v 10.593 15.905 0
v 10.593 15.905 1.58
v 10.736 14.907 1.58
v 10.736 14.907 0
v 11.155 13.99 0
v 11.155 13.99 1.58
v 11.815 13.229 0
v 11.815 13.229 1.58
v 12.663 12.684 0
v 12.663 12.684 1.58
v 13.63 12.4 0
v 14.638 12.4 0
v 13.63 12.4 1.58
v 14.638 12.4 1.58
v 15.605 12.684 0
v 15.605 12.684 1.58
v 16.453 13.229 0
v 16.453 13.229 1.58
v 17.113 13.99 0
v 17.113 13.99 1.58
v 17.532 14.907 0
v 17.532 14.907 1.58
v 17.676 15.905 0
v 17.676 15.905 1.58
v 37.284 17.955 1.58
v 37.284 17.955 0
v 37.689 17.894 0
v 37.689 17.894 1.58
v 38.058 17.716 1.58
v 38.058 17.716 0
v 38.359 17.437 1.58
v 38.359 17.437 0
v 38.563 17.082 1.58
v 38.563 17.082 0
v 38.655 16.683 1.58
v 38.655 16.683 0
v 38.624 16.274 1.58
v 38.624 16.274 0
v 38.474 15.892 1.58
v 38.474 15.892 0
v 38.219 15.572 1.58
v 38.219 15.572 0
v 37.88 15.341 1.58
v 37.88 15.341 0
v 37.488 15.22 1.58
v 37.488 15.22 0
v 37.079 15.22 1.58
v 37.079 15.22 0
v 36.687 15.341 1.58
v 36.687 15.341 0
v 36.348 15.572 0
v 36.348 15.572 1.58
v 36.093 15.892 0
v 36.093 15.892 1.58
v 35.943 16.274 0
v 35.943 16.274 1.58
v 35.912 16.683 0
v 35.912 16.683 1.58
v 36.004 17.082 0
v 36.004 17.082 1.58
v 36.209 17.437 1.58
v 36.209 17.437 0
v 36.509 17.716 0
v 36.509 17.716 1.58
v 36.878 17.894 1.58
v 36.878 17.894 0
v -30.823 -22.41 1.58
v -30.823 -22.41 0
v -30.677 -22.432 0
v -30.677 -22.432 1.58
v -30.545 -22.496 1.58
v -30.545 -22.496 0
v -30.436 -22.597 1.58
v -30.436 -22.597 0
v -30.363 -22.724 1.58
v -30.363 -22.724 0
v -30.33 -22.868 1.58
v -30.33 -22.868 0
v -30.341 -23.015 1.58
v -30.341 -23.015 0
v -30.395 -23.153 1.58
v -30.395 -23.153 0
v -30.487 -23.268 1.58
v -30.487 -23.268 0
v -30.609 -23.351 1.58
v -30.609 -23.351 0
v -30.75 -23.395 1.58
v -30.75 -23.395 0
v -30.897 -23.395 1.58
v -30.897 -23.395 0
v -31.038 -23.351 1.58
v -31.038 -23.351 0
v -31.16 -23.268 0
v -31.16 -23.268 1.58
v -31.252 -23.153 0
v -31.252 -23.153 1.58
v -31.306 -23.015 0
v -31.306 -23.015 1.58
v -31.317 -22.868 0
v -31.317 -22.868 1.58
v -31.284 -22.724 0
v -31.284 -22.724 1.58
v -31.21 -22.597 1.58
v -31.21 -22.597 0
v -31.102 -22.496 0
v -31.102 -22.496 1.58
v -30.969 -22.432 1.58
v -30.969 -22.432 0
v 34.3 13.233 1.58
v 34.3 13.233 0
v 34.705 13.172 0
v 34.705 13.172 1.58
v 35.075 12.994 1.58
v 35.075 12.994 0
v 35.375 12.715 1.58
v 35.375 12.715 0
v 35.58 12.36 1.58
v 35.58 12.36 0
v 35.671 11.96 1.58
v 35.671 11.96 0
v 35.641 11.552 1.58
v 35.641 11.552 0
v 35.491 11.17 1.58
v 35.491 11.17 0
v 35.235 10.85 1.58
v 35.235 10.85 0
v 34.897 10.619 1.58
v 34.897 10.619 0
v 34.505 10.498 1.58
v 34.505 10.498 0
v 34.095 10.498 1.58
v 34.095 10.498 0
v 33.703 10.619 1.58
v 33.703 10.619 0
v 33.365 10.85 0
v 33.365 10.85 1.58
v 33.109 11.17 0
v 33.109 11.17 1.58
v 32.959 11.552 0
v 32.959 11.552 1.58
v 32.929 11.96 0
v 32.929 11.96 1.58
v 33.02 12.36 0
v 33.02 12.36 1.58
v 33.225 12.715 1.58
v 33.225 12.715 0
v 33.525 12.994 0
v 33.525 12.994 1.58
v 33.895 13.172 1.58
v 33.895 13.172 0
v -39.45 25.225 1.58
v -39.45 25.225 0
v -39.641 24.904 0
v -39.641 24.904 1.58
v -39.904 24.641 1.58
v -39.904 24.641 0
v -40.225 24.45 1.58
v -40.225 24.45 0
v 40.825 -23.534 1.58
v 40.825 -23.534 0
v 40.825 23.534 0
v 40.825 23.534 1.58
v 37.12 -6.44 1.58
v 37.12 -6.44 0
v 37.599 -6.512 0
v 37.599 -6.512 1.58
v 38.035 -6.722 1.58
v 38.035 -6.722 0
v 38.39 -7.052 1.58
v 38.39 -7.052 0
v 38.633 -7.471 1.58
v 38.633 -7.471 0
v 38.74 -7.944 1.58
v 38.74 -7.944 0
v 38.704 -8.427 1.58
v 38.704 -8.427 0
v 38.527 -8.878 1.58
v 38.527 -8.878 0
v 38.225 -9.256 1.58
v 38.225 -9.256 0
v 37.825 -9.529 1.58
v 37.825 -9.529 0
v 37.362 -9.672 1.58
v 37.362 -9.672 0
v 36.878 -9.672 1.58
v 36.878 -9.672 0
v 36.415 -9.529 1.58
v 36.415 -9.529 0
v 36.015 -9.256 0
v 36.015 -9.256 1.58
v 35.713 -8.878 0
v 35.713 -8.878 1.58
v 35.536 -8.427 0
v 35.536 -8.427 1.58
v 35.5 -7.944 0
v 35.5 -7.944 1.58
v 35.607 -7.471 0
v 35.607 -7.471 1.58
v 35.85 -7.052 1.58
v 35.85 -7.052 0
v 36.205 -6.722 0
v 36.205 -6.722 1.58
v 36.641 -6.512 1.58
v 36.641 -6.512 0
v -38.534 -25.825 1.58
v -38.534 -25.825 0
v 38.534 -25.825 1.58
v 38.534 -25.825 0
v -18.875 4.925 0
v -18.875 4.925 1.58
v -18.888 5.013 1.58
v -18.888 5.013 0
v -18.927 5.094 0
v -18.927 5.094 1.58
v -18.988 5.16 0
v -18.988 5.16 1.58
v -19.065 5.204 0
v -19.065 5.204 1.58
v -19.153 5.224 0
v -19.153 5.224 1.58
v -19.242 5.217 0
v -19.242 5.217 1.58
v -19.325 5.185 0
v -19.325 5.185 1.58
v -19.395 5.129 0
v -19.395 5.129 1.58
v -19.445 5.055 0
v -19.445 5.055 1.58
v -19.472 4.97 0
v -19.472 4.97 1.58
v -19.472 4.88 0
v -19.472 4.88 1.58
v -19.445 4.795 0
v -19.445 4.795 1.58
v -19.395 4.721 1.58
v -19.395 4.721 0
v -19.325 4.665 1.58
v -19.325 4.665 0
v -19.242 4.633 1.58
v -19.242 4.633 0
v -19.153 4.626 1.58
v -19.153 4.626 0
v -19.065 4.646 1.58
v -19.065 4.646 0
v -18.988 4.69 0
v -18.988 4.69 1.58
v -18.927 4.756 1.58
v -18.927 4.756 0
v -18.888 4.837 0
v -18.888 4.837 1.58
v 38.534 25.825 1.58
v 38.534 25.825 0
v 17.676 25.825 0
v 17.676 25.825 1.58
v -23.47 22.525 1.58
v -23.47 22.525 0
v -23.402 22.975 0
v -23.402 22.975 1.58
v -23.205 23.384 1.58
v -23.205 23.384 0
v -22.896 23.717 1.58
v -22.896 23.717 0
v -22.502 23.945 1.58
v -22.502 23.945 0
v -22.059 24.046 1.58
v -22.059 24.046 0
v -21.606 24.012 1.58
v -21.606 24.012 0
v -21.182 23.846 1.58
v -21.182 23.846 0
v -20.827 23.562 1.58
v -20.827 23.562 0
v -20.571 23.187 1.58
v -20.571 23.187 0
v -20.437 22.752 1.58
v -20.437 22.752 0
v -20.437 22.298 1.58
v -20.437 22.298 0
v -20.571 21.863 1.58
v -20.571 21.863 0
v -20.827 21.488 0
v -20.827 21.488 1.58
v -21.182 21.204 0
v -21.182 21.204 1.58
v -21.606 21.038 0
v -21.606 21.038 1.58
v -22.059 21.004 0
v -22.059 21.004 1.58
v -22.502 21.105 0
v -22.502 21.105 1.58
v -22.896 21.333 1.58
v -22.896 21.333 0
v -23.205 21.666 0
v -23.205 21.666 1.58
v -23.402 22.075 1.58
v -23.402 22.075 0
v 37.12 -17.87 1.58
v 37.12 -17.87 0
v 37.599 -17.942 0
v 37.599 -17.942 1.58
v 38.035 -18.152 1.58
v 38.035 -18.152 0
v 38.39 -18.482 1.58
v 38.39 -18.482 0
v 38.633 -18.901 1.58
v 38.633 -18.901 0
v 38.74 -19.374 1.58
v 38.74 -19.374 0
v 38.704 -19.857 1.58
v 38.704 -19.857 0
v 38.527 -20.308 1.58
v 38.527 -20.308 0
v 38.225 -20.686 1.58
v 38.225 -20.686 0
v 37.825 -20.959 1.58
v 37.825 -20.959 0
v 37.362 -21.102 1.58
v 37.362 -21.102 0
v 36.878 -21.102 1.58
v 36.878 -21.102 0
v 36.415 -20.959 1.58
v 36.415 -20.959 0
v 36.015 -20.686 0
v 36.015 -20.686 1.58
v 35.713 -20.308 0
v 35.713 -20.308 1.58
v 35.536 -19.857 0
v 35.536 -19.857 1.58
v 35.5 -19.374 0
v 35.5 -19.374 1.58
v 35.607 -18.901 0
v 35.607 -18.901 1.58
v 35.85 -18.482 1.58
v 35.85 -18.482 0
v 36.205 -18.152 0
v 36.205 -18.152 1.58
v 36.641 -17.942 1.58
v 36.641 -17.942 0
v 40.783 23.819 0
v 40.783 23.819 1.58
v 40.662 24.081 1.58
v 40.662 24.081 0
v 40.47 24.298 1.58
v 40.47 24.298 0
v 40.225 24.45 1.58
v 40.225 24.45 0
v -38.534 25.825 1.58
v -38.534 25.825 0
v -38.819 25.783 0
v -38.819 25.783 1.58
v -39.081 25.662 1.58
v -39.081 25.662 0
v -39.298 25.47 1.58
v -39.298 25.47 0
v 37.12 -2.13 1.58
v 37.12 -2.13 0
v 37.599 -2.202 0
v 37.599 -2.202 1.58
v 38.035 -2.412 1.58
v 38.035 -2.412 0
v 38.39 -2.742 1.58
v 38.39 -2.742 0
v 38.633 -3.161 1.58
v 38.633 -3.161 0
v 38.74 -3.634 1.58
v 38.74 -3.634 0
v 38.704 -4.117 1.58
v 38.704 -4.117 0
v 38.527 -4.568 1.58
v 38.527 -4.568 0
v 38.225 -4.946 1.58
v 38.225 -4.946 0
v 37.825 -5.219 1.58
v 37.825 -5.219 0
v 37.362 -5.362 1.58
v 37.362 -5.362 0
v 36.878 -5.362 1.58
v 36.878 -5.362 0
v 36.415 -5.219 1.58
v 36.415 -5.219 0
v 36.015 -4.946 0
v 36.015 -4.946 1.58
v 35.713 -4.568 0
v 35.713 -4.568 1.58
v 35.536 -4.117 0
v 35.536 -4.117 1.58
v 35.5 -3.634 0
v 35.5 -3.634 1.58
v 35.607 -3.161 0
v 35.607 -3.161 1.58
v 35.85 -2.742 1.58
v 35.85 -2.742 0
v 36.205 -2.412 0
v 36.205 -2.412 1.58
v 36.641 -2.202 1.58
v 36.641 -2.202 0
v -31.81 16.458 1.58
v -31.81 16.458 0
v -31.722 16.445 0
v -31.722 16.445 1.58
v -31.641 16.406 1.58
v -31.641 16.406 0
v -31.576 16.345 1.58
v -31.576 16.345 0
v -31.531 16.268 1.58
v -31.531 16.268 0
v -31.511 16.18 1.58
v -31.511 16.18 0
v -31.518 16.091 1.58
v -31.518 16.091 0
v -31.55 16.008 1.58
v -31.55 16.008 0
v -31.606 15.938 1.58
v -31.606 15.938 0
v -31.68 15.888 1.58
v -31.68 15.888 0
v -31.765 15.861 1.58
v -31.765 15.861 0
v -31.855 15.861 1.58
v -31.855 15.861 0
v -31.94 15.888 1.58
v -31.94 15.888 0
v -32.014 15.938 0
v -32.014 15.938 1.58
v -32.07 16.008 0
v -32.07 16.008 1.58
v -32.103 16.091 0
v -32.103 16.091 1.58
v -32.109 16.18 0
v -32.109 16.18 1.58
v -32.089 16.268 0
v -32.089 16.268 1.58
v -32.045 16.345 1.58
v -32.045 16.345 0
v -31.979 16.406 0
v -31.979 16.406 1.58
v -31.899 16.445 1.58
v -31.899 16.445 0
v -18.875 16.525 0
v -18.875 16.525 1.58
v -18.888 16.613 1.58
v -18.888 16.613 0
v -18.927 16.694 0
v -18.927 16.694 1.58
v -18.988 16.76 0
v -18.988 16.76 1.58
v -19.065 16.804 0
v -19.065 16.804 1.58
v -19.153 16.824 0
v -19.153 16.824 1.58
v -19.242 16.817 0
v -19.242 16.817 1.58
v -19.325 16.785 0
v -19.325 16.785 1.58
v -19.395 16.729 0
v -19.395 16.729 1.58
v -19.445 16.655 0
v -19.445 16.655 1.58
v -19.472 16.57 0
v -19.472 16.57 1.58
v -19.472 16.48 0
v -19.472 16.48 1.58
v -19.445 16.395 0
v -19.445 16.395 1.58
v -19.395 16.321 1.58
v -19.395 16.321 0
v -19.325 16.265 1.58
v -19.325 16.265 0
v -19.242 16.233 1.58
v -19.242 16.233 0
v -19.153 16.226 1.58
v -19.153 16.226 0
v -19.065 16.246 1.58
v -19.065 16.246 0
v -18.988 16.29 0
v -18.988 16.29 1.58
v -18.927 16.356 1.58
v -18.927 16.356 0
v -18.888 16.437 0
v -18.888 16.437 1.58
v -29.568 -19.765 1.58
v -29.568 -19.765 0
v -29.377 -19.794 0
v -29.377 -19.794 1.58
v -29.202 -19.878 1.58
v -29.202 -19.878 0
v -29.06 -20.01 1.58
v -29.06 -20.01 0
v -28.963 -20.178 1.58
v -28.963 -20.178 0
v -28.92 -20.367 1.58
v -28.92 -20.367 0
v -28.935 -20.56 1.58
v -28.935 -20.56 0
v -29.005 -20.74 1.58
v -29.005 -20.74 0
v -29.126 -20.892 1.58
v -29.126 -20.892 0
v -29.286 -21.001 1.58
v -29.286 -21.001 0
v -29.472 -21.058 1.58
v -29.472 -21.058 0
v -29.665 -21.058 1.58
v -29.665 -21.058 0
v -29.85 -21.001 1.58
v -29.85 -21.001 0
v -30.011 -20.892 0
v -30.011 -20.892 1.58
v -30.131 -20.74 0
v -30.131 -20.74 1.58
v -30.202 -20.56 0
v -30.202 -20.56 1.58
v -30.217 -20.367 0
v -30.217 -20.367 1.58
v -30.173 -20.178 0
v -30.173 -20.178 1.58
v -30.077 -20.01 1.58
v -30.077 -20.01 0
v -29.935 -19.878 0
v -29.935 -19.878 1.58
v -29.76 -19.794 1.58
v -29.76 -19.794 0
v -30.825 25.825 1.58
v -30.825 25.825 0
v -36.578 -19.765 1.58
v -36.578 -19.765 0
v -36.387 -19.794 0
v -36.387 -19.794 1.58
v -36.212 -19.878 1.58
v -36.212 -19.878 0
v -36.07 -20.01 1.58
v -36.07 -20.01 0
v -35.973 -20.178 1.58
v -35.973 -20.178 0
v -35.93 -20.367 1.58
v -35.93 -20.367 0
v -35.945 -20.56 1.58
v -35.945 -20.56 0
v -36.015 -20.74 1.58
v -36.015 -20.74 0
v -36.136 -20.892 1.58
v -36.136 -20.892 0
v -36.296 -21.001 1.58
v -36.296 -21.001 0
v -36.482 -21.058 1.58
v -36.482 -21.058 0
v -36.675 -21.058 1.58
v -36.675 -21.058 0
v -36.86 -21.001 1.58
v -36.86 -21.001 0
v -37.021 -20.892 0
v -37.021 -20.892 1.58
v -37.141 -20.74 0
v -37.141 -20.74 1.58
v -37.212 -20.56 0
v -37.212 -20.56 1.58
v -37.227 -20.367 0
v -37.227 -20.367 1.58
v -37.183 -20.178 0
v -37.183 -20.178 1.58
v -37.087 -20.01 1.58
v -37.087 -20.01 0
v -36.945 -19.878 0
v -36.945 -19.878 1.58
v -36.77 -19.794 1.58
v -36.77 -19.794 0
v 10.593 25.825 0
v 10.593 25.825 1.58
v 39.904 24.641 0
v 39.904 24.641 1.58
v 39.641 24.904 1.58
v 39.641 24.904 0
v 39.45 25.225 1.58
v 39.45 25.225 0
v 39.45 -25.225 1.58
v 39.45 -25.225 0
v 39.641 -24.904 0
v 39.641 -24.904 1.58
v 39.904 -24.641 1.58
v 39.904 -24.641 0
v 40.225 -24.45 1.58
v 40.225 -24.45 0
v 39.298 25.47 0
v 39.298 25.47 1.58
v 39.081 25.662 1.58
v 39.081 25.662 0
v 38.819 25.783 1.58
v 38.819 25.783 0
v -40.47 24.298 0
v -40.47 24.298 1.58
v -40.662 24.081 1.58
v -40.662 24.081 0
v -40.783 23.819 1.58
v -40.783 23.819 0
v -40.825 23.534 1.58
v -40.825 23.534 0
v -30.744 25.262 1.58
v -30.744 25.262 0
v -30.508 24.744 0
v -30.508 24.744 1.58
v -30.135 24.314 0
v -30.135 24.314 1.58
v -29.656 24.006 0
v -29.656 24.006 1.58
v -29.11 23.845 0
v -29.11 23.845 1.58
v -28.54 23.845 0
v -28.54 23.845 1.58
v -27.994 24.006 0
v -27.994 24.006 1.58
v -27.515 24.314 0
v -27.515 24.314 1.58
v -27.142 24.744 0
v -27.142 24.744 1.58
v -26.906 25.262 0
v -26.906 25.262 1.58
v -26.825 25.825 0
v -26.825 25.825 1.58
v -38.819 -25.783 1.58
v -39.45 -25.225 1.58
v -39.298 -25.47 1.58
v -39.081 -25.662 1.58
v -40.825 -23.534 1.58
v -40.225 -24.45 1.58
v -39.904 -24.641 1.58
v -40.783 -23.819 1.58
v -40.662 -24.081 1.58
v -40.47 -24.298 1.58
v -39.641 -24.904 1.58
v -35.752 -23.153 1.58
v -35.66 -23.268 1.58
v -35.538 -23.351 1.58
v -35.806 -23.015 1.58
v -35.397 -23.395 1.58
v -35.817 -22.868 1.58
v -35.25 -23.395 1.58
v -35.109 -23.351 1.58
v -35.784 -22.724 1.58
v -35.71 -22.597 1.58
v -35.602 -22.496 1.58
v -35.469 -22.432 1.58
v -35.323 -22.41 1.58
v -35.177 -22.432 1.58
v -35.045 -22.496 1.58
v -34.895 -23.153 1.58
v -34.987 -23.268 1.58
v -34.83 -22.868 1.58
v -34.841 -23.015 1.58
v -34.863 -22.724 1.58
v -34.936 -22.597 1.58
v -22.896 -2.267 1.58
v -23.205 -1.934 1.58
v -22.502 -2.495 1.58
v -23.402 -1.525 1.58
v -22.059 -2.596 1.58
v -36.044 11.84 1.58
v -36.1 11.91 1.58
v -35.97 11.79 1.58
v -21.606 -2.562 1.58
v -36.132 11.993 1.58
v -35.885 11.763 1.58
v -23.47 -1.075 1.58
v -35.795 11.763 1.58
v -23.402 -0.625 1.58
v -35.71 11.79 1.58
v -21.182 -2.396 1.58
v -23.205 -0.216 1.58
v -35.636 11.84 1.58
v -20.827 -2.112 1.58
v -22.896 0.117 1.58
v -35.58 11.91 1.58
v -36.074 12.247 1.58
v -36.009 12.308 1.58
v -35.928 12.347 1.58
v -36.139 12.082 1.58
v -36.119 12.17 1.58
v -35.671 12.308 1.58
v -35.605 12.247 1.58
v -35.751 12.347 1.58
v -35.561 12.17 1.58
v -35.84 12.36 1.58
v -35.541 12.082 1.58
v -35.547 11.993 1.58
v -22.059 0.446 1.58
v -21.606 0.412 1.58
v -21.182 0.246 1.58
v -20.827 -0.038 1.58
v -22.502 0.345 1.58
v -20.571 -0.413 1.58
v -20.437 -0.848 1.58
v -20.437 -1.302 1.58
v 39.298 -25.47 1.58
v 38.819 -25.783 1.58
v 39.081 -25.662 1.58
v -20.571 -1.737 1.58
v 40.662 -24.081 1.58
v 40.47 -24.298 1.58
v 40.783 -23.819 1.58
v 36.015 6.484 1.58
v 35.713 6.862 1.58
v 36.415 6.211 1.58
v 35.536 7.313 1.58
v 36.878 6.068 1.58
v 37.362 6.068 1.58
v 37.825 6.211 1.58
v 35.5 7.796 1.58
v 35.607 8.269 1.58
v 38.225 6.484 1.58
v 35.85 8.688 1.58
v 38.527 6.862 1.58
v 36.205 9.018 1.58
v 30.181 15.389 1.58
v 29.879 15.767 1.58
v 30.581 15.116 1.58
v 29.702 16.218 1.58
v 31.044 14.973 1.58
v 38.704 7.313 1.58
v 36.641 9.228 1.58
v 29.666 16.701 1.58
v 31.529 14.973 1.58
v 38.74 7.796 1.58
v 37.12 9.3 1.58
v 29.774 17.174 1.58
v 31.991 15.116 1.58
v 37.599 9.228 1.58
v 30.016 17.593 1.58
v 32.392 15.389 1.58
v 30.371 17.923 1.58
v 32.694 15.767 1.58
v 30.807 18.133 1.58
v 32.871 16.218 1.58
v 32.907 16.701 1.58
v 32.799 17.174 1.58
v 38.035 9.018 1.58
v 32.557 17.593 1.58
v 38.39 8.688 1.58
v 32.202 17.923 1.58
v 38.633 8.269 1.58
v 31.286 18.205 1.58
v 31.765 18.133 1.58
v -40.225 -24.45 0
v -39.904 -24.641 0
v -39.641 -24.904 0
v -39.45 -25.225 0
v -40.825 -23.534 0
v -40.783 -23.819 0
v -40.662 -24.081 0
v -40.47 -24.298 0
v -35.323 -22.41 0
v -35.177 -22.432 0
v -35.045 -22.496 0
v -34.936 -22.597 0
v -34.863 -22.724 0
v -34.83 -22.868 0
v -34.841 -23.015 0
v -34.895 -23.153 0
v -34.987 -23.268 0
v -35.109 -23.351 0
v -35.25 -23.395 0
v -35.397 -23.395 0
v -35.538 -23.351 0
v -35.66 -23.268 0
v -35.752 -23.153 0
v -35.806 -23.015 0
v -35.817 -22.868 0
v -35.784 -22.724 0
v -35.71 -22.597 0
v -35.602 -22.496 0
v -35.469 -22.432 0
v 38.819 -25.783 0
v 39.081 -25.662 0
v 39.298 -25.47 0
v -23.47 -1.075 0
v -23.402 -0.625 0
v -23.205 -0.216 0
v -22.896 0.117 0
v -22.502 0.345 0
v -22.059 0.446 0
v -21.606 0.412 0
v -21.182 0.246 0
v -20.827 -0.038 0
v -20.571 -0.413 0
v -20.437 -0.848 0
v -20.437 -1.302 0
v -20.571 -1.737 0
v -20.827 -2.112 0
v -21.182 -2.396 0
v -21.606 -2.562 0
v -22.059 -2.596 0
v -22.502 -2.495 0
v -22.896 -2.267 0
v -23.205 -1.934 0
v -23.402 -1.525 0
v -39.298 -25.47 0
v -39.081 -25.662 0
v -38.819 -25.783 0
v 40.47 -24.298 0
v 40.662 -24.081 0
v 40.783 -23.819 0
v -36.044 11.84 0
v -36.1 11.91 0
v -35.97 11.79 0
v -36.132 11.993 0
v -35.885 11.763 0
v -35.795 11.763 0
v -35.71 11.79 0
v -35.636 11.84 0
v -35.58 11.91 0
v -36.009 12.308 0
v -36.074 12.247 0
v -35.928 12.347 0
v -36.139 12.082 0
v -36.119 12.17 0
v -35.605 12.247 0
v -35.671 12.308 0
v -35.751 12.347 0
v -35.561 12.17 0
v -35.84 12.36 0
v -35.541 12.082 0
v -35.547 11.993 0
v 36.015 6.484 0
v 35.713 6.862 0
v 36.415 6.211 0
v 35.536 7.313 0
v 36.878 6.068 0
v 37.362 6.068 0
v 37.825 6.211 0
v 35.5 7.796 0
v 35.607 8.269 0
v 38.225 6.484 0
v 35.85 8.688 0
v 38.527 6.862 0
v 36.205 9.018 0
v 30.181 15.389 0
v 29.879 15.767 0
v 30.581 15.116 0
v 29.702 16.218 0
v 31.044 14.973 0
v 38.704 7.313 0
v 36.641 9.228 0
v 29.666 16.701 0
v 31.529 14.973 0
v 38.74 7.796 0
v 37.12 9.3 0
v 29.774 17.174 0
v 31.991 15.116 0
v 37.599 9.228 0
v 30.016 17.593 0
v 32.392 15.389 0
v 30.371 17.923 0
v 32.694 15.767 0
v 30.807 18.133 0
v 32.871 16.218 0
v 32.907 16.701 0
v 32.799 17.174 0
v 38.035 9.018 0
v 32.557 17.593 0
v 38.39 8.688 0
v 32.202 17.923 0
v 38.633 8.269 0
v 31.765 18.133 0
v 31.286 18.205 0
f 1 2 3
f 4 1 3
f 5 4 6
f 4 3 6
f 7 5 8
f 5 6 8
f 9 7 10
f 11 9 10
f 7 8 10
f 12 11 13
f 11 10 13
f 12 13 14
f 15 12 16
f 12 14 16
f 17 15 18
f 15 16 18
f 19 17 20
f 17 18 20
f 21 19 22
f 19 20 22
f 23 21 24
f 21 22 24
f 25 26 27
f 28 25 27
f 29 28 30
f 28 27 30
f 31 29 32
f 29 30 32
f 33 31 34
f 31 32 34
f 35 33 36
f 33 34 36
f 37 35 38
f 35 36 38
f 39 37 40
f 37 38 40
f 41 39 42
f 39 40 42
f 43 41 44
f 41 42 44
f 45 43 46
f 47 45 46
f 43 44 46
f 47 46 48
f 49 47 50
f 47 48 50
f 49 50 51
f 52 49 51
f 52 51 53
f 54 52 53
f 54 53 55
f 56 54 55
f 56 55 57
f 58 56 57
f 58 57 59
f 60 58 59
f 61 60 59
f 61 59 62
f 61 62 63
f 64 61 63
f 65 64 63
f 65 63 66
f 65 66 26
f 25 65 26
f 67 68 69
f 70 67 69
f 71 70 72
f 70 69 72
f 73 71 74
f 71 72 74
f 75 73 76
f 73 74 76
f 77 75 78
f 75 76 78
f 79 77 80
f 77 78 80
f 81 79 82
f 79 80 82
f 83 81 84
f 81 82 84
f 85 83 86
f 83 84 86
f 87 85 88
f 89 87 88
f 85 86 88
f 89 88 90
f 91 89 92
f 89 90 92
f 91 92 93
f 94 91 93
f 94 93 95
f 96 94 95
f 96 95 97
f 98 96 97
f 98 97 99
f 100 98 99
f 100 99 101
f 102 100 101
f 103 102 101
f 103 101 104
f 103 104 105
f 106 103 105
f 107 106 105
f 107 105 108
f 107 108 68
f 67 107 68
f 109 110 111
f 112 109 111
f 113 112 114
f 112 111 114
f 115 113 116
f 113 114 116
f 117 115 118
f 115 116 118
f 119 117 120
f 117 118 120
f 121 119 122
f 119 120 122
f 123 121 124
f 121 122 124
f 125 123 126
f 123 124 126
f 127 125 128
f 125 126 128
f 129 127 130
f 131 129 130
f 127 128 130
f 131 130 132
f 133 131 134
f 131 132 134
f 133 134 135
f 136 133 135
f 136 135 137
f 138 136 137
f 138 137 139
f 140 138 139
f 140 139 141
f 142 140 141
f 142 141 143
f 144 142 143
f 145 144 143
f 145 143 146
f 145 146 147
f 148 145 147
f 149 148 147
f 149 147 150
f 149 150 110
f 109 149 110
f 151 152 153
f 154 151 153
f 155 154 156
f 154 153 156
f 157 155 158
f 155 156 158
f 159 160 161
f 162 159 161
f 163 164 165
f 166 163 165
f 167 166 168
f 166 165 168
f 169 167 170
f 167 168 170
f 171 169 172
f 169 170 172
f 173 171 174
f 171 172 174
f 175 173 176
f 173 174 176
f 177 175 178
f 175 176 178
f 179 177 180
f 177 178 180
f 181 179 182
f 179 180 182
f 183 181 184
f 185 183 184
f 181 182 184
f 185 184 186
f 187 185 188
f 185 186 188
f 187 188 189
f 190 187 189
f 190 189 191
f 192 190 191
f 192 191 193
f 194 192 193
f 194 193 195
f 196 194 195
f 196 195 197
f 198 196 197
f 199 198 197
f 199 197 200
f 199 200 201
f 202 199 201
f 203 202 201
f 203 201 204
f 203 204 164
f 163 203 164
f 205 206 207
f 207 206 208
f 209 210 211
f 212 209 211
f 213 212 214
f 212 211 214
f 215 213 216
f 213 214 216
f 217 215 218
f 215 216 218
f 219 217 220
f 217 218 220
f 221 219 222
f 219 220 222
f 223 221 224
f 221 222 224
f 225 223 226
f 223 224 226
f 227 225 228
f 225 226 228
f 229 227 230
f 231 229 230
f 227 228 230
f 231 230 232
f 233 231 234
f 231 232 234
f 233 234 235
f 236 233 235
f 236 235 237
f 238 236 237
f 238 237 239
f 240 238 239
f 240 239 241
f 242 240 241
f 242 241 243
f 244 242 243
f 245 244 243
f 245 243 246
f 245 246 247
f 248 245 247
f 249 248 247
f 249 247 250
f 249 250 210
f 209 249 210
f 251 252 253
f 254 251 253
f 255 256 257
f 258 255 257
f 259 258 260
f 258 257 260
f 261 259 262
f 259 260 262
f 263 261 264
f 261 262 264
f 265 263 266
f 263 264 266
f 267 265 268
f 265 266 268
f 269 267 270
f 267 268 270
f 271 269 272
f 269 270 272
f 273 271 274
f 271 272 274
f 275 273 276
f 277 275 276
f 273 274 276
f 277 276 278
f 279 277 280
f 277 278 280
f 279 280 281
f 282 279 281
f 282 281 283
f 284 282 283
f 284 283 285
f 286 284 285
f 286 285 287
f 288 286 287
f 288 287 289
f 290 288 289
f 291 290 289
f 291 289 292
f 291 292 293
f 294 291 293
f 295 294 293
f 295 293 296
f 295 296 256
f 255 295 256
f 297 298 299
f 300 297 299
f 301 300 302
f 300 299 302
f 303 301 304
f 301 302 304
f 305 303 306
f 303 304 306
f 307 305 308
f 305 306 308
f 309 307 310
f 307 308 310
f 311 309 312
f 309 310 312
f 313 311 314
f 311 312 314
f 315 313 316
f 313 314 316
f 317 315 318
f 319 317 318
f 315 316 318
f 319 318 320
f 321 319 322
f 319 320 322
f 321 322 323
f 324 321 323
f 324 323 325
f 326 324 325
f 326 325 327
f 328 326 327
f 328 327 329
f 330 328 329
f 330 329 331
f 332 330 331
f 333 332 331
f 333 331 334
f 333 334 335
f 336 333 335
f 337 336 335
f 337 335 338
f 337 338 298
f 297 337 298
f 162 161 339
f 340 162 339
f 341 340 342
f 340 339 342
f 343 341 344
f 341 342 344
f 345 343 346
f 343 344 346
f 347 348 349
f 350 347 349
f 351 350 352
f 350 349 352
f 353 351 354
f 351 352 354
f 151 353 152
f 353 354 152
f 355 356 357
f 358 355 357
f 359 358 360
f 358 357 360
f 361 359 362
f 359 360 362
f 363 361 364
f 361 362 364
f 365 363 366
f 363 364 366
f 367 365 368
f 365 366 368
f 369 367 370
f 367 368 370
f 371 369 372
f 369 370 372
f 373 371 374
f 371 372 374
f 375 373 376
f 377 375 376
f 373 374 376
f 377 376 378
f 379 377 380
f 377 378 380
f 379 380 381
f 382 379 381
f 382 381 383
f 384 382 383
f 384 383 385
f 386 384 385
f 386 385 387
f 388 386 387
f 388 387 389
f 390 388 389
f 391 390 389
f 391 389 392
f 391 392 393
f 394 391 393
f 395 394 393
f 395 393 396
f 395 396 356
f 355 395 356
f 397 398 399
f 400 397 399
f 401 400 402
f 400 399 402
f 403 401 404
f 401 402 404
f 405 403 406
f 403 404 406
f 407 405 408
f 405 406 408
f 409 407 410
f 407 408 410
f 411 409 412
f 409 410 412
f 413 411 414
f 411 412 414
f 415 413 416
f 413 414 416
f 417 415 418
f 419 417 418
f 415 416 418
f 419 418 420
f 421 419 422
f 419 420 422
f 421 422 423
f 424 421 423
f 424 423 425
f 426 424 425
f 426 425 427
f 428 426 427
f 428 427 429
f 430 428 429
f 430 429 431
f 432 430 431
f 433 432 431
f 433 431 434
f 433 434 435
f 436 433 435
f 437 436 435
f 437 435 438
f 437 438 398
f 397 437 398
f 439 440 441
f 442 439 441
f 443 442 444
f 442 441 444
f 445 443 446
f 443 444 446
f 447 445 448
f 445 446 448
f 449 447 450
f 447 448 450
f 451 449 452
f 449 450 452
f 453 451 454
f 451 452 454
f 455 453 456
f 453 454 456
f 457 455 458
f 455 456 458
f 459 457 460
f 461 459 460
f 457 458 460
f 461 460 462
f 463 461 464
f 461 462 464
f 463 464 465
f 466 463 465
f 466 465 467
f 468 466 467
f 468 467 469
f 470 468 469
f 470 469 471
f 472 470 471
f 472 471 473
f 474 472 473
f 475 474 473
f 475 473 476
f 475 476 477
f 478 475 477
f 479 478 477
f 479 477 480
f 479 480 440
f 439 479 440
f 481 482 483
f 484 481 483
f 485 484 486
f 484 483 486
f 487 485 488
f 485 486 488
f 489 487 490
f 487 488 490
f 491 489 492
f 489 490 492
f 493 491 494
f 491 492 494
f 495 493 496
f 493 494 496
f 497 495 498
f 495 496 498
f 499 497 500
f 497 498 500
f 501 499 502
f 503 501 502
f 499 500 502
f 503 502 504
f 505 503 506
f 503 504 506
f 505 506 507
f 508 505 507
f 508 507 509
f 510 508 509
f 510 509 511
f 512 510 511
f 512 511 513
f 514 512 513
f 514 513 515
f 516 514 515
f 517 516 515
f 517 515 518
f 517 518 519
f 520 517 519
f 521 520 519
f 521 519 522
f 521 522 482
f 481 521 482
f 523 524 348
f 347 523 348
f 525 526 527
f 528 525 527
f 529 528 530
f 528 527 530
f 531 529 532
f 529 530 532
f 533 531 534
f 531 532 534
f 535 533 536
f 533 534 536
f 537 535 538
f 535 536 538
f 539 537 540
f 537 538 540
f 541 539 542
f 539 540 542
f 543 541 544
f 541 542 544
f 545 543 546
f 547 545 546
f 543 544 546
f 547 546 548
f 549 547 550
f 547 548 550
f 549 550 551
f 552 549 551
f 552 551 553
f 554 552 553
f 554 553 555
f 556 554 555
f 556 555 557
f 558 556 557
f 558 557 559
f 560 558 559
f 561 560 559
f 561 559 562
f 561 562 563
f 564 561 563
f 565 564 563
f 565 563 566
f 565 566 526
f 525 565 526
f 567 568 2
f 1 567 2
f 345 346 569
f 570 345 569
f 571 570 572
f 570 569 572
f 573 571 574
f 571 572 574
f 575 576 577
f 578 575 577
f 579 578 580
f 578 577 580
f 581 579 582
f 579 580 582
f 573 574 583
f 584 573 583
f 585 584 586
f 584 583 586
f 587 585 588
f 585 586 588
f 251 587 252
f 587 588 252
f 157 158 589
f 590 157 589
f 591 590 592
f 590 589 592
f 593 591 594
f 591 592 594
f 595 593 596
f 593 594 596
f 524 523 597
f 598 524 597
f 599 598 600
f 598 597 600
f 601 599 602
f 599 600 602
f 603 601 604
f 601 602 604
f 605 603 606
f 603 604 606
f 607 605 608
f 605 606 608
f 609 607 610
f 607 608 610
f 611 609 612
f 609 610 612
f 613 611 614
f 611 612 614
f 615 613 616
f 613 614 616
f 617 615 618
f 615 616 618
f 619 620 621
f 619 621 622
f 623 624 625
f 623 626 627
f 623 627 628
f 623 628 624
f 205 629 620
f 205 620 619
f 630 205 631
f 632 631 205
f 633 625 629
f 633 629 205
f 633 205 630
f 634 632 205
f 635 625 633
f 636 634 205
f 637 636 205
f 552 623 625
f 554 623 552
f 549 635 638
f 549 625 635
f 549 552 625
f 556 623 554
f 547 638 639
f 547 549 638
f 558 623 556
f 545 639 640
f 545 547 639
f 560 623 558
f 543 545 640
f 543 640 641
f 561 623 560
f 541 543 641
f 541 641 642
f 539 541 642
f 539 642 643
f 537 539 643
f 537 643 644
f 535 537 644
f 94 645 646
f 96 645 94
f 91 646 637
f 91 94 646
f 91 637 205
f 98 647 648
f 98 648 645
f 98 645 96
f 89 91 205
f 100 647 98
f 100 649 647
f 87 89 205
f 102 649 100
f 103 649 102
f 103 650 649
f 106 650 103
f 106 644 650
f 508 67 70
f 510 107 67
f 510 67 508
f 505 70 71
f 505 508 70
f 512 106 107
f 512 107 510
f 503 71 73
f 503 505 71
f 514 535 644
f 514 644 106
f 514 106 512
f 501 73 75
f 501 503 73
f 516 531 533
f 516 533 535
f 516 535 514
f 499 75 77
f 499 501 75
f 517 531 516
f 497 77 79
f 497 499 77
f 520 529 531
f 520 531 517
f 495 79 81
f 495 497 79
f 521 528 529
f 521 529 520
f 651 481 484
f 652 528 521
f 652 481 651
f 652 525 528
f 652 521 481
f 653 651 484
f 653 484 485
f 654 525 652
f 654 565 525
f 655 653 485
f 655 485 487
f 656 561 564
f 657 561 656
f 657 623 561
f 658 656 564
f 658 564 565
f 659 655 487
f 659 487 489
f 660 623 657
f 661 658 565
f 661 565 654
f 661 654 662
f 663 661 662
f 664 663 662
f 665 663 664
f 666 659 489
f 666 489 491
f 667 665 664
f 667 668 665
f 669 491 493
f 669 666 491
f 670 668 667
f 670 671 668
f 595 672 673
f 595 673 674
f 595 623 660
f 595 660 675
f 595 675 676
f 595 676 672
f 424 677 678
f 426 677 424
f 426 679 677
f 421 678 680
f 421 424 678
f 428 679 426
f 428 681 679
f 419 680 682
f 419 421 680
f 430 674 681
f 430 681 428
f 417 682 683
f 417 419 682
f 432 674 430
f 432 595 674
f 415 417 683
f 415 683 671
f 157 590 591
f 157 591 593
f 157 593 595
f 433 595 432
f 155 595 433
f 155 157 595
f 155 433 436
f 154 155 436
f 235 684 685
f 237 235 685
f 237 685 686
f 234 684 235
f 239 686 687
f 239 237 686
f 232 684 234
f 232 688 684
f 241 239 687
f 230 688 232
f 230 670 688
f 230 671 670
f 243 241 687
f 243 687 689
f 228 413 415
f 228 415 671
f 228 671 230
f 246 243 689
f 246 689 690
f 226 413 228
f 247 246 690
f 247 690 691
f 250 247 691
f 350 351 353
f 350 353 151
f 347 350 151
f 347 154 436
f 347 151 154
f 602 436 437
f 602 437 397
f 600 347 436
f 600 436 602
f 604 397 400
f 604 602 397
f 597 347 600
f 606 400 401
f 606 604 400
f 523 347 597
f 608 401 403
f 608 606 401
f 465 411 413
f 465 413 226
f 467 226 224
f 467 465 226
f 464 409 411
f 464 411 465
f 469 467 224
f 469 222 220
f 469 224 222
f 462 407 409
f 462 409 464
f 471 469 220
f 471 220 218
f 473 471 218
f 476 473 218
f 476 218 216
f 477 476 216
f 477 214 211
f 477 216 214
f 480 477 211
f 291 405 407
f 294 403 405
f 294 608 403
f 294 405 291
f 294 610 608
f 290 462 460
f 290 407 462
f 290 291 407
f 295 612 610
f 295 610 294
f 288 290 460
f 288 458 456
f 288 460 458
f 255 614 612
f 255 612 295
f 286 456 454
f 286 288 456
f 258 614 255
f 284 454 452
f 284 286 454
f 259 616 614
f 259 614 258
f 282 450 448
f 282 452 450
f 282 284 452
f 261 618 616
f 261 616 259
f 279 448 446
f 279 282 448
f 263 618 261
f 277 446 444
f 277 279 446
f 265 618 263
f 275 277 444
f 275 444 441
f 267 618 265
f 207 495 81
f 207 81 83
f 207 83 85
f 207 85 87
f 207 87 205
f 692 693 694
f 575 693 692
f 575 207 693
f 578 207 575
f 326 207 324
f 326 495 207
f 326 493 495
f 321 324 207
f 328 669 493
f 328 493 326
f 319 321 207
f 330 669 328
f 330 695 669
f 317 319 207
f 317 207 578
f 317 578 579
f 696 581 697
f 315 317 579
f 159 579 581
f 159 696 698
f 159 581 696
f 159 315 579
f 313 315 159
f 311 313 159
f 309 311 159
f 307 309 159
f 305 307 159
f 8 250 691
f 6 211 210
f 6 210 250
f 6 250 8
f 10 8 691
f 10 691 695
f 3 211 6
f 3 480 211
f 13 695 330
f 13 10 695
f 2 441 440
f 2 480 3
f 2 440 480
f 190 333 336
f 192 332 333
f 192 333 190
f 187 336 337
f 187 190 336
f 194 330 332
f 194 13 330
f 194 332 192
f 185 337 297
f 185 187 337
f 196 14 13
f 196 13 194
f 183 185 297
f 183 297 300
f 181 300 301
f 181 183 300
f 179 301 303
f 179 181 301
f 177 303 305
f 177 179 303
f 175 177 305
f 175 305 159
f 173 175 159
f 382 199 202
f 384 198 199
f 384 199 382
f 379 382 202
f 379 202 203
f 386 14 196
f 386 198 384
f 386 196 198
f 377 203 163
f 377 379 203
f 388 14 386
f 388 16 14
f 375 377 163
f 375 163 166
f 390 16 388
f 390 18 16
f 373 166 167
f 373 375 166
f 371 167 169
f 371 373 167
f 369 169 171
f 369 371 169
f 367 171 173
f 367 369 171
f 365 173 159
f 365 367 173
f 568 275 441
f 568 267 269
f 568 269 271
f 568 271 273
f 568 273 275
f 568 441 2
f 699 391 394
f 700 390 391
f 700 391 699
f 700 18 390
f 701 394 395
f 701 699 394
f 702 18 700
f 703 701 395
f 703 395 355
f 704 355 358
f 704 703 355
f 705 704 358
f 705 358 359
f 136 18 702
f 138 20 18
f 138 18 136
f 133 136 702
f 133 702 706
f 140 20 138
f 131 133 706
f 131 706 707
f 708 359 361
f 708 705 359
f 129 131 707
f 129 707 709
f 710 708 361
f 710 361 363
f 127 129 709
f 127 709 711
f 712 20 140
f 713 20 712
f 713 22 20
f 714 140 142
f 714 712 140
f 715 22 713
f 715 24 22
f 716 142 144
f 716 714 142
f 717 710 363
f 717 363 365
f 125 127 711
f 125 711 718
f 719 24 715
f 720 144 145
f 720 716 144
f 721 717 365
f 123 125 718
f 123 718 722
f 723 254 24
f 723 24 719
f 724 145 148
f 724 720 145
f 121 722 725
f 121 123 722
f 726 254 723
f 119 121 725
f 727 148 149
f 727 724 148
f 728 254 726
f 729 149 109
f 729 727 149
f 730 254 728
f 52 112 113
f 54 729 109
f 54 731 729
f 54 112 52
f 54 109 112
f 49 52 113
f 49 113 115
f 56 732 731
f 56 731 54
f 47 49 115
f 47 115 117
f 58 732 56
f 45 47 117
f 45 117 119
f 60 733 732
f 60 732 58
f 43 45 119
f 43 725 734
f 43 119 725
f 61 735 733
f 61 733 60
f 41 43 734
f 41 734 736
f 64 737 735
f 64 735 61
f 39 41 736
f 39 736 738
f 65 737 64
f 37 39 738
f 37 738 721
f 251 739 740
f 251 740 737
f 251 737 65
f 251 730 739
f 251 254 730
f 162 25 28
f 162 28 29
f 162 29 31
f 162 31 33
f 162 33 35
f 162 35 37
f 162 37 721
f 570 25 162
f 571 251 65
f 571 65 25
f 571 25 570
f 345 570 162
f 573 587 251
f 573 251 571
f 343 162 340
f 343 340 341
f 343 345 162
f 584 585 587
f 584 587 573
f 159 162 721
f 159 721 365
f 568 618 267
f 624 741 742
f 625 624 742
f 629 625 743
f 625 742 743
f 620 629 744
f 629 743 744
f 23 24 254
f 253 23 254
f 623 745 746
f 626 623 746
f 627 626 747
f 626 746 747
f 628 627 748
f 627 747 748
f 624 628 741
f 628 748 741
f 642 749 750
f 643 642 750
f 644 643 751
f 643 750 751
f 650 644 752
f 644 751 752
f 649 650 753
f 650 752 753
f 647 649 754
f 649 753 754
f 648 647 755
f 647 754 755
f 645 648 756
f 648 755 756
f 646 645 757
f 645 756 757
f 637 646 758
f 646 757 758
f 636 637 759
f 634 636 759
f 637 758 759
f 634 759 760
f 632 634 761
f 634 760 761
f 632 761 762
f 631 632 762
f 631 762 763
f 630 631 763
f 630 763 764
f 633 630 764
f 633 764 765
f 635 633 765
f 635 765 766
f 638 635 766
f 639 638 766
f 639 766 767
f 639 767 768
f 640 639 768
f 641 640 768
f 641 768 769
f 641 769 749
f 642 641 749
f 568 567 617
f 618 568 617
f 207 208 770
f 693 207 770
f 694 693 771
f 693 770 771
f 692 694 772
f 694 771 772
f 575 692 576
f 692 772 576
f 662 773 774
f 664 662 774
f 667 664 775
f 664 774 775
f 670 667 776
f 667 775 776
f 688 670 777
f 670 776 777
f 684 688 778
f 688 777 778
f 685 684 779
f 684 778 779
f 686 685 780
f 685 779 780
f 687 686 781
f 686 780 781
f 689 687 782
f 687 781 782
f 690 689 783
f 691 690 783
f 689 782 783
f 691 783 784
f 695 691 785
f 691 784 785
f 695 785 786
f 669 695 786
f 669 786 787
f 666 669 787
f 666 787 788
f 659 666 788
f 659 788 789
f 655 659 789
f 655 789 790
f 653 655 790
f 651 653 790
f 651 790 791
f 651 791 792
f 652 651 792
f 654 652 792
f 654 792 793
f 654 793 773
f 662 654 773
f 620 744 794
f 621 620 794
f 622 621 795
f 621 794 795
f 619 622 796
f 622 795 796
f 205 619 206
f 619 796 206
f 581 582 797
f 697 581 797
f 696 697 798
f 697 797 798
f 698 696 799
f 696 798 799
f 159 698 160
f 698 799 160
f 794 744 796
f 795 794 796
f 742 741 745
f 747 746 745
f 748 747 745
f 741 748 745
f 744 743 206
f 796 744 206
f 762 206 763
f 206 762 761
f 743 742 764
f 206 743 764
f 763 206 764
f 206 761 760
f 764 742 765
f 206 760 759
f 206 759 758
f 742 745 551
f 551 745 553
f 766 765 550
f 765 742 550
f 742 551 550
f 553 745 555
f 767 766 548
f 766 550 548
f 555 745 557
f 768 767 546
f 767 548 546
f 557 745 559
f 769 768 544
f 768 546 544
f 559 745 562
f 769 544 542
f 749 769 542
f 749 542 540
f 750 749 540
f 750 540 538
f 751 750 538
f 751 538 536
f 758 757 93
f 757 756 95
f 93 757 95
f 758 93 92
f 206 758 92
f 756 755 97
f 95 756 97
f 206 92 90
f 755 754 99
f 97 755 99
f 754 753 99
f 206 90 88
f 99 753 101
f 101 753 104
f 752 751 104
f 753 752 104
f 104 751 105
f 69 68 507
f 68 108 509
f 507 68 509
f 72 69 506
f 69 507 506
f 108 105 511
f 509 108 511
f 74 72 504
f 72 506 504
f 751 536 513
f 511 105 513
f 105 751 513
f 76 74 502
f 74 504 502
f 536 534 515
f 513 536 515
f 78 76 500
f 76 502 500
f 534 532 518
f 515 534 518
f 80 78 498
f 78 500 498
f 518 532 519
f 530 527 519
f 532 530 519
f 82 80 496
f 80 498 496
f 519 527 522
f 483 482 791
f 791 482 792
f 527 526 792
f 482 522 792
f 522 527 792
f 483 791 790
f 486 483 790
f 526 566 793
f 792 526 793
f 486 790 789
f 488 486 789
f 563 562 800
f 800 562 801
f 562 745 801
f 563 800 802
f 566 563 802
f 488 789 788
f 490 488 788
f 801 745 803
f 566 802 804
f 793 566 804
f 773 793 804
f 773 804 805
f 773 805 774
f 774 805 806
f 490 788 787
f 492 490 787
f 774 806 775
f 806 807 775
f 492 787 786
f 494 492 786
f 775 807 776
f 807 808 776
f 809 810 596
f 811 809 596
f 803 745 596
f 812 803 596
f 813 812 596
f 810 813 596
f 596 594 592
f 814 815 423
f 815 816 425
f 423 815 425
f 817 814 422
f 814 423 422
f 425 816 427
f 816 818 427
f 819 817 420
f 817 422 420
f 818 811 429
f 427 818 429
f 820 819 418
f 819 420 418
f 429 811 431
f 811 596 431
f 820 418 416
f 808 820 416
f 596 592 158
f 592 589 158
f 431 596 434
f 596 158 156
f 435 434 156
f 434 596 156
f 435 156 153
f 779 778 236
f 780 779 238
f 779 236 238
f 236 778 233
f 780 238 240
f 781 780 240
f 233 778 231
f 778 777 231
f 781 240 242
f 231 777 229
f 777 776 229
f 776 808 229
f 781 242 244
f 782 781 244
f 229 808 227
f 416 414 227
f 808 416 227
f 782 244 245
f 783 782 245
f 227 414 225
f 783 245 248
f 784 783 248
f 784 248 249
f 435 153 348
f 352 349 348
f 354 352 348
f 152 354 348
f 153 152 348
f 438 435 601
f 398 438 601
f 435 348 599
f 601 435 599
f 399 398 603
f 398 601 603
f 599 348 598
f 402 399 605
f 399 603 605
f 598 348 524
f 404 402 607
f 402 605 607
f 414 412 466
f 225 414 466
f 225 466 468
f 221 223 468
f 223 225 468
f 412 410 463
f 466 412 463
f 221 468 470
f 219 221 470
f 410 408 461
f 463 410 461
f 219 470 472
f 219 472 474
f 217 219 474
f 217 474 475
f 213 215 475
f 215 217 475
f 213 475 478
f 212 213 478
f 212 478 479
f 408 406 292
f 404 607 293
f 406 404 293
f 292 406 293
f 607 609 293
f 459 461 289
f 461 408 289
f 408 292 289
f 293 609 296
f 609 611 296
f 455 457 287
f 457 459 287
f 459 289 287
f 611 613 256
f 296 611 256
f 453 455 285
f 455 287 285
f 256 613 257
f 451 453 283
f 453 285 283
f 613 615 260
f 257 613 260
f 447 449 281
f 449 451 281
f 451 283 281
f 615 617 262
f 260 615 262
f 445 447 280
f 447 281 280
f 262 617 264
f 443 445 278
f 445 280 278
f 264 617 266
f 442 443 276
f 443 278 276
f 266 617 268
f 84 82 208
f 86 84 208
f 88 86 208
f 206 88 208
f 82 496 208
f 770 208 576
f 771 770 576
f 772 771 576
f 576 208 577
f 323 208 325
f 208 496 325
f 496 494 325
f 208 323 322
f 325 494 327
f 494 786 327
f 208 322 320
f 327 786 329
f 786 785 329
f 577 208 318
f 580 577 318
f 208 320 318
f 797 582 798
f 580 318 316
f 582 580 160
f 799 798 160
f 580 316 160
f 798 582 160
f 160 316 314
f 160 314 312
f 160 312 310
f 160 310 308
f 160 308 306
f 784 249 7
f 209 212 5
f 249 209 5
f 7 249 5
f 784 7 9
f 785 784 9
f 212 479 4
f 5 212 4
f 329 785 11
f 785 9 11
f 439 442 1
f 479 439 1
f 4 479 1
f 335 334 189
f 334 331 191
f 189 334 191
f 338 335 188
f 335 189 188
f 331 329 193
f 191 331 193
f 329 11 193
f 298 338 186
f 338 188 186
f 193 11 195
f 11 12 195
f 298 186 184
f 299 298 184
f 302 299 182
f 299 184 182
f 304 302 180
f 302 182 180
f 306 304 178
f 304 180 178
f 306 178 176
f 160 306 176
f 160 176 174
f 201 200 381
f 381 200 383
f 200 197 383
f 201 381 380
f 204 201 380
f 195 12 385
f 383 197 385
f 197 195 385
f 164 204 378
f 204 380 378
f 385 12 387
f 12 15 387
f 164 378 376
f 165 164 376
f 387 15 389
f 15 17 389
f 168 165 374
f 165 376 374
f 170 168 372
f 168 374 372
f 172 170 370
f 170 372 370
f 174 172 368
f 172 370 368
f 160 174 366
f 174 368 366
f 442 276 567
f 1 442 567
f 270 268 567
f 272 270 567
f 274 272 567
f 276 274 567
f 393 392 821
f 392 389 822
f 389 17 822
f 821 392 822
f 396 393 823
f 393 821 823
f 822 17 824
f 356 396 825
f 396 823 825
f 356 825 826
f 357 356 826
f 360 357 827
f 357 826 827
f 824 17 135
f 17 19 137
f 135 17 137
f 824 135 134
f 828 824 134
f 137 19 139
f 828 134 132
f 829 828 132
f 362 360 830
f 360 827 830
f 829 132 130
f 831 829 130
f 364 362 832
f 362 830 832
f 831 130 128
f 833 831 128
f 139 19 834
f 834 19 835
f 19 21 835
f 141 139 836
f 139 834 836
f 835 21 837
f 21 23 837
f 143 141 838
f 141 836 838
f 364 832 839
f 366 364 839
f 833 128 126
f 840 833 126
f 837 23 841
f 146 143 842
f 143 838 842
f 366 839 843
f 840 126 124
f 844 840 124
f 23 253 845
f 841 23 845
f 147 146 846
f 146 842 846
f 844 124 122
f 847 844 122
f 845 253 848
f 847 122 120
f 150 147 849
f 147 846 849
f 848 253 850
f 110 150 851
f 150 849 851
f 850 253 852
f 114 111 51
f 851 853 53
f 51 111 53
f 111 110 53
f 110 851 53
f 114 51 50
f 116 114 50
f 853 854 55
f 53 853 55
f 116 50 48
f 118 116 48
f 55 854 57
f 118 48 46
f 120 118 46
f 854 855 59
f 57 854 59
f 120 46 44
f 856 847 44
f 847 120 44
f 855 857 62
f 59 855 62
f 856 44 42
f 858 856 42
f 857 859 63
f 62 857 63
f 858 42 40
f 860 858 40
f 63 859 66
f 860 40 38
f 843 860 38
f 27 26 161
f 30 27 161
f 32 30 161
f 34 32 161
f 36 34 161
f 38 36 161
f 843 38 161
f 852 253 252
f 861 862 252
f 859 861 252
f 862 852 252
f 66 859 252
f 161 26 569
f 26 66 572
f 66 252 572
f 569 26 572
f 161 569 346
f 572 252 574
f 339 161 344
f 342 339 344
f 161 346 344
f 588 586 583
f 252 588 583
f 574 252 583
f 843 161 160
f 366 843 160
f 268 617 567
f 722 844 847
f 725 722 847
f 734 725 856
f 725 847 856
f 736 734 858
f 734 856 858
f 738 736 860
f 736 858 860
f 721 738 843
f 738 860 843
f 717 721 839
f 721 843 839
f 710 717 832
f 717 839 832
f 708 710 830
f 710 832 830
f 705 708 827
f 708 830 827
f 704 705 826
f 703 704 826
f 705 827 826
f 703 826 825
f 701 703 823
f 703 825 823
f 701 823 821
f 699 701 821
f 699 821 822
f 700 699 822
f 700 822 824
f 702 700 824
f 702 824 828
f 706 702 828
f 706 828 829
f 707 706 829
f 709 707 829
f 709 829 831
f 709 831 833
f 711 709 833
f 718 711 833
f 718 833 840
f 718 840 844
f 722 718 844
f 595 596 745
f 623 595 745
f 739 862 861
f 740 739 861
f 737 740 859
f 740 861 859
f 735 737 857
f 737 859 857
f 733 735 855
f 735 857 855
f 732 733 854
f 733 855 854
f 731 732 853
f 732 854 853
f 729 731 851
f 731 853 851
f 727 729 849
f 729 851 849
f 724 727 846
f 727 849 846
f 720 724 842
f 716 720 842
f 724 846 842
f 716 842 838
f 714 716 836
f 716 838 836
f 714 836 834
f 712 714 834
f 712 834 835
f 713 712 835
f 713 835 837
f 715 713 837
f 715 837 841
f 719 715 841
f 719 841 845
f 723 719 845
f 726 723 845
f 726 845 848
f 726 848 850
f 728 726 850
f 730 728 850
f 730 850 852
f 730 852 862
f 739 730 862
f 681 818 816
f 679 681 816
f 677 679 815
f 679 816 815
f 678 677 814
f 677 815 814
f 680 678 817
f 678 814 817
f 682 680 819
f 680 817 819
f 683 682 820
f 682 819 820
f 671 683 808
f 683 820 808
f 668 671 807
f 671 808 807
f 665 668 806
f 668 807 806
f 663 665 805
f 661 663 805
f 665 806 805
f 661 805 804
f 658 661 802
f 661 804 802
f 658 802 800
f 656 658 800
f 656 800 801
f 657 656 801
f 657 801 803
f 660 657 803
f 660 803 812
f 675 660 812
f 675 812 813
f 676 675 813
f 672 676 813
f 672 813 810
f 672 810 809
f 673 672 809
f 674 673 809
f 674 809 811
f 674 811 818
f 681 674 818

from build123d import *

# Parameters (mm, degrees)
BOSS_EXTRUDE2_DEPTH = 1.58
CUT_EXTRUDE4_DEPTH  = 49.333297529
SKETCH6_R           = 0.3
CUT_EXTRUDE9_DEPTH  = 49.333297529
SKETCH5_R           = 0.3
SKETCH5_R_2         = 1.525
CUT_EXTRUDE10_DEPTH = 49.333297529
SKETCH7_R           = 0.65
SKETCH7_R_2         = 0.495
SKETCH7_R_3         = 0.3
SKETCH7_R_4         = 1.625
SKETCH7_R_5         = 1.375
CUT_EXTRUDE11_DEPTH = 49.333297529
SKETCH13_R          = 2
CUT_EXTRUDE12_DEPTH = 49.333297529


with BuildPart() as part:
    # Sketch3 → Boss-Extrude2 (new body)
    with BuildSketch(Plane.XY):
        with BuildLine():
            Line((-38.533712153, -25.825), (38.533712153, -25.825))
            ThreePointArc((38.533712153, -25.825), (39.08143471, -25.661660027), (39.450227292, -25.225))
            ThreePointArc((39.450227292, -25.225), (39.764339828, -24.764339828), (40.225, -24.450227292))
            ThreePointArc((40.225, -24.450227292), (40.661660027, -24.08143471), (40.825, -23.533712153))
            Line((40.825, -23.533712153), (40.825, 23.533712153))
            ThreePointArc((40.825, 23.533712153), (40.661660027, 24.08143471), (40.225, 24.450227292))
            ThreePointArc((40.225, 24.450227292), (39.764339828, 24.764339828), (39.450227292, 25.225))
            ThreePointArc((39.450227292, 25.225), (39.08143471, 25.661660027), (38.533712153, 25.825))
            Line((38.533712153, 25.825), (-38.533712153, 25.825))
            ThreePointArc((-38.533712153, 25.825), (-39.08143471, 25.661660027), (-39.450227292, 25.225))
            ThreePointArc((-39.450227292, 25.225), (-39.764339828, 24.764339828), (-40.225, 24.450227292))
            ThreePointArc((-40.225, 24.450227292), (-40.661660027, 24.08143471), (-40.825, 23.533712153))
            Line((-40.825, 23.533712153), (-40.825, -23.533712153))
            ThreePointArc((-40.825, -23.533712153), (-40.661660027, -24.08143471), (-40.225, -24.450227292))
            ThreePointArc((-40.225, -24.450227292), (-39.764339828, -24.764339828), (-39.450227292, -25.225))
            ThreePointArc((-39.450227292, -25.225), (-39.08143471, -25.661660027), (-38.533712153, -25.825))
        make_face()
    extrude(amount=BOSS_EXTRUDE2_DEPTH)

    # Sketch8 → Cut-Extrude4 (cut, through all)
    with BuildSketch(Plane.XY.offset(1.58)):
        with BuildLine():
            Line((10.592557127, 25.825), (10.592557127, 15.905077804))
            ThreePointArc((10.592557127, 15.905077804), (14.134043321, 12.36359161), (17.675529515, 15.905077804))
            Line((17.675529515, 15.905077804), (17.675529515, 25.825))
            Line((17.675529515, 25.825), (10.592557127, 25.825))
        make_face()
    extrude(amount=-CUT_EXTRUDE4_DEPTH, mode=Mode.SUBTRACT)

    # Sketch6 → Cut-Extrude9 (cut, through all)
    with BuildSketch(Plane.XY.offset(1.58)):
        with Locations((-19.175, 16.525)):
            Circle(SKETCH6_R)
        with Locations((-19.175, 4.925)):
            Circle(SKETCH6_R)
    extrude(amount=-CUT_EXTRUDE9_DEPTH, mode=Mode.SUBTRACT)

    # Sketch5 → Cut-Extrude10 (cut, through all)
    with BuildSketch(Plane(origin=(0, 0, 0), x_dir=(1, 0, 0), z_dir=(0, 0, -1))):
        with Locations((-19.175, -4.925)):
            Circle(SKETCH5_R)
        with Locations((-19.175, -16.525)):
            Circle(SKETCH5_R)
        with Locations(Location((-21.945, -22.525, 0), (0, 0, 180))):
            Circle(SKETCH5_R_2)
        with Locations(Location((-21.945, 1.075, 0), (0, 0, 180))):
            Circle(SKETCH5_R_2)
    extrude(amount=-CUT_EXTRUDE10_DEPTH, mode=Mode.SUBTRACT)

    # Sketch7 → Cut-Extrude11 (cut, through all)
    with BuildSketch(Plane(origin=(0, 0, 0), x_dir=(1, 0, 0), z_dir=(0, 0, -1))):
        with Locations(Location((-36.578389688, 20.415177754, 0), (0, 0, 270))):
            Circle(SKETCH7_R)
        with Locations(Location((-29.568389688, 20.415177754, 0), (0, 0, 270))):
            Circle(SKETCH7_R)
        with Locations(Location((-35.323389688, 22.905177754, 0), (0, 0, 270))):
            Circle(SKETCH7_R_2)
        with Locations(Location((-30.823389688, 22.905177754, 0), (0, 0, 270))):
            Circle(SKETCH7_R_2)
        with Locations(Location((-35.839874228, -12.060017363, 0), (0, 0, 270))):
            Circle(SKETCH7_R_3)
        with Locations(Location((-31.810125772, -16.157982637, 0), (0, 0, 270))):
            Circle(SKETCH7_R_3)
        with Locations(Location((31.286432501, -16.58, 0), (0, 0, 270))):
            Circle(SKETCH7_R_4)
        with Locations(Location((37.283538512, -16.58, 0), (0, 0, 270))):
            Circle(SKETCH7_R_5)
        with Locations(Location((34.3, -11.85761971, 0), (0, 0, 270))):
            Circle(SKETCH7_R_5)
        with Locations(Location((37.12, -7.675, 0), (0, 0, 270))):
            Circle(SKETCH7_R_4)
        with Locations(Location((37.12, 3.755, 0), (0, 0, 270))):
            Circle(SKETCH7_R_4)
        with Locations(Location((37.12, 8.065, 0), (0, 0, 270))):
            Circle(SKETCH7_R_4)
        with Locations(Location((37.12, 19.495, 0), (0, 0, 270))):
            Circle(SKETCH7_R_4)
    extrude(amount=-CUT_EXTRUDE11_DEPTH, mode=Mode.SUBTRACT)

    # Sketch13 → Cut-Extrude12 (cut, through all)
    with BuildSketch(Plane.XY.offset(1.58)):
        with Locations((-28.825, 25.825)):
            Circle(SKETCH13_R)
    extrude(amount=-CUT_EXTRUDE12_DEPTH, mode=Mode.SUBTRACT)


solid = part.part
